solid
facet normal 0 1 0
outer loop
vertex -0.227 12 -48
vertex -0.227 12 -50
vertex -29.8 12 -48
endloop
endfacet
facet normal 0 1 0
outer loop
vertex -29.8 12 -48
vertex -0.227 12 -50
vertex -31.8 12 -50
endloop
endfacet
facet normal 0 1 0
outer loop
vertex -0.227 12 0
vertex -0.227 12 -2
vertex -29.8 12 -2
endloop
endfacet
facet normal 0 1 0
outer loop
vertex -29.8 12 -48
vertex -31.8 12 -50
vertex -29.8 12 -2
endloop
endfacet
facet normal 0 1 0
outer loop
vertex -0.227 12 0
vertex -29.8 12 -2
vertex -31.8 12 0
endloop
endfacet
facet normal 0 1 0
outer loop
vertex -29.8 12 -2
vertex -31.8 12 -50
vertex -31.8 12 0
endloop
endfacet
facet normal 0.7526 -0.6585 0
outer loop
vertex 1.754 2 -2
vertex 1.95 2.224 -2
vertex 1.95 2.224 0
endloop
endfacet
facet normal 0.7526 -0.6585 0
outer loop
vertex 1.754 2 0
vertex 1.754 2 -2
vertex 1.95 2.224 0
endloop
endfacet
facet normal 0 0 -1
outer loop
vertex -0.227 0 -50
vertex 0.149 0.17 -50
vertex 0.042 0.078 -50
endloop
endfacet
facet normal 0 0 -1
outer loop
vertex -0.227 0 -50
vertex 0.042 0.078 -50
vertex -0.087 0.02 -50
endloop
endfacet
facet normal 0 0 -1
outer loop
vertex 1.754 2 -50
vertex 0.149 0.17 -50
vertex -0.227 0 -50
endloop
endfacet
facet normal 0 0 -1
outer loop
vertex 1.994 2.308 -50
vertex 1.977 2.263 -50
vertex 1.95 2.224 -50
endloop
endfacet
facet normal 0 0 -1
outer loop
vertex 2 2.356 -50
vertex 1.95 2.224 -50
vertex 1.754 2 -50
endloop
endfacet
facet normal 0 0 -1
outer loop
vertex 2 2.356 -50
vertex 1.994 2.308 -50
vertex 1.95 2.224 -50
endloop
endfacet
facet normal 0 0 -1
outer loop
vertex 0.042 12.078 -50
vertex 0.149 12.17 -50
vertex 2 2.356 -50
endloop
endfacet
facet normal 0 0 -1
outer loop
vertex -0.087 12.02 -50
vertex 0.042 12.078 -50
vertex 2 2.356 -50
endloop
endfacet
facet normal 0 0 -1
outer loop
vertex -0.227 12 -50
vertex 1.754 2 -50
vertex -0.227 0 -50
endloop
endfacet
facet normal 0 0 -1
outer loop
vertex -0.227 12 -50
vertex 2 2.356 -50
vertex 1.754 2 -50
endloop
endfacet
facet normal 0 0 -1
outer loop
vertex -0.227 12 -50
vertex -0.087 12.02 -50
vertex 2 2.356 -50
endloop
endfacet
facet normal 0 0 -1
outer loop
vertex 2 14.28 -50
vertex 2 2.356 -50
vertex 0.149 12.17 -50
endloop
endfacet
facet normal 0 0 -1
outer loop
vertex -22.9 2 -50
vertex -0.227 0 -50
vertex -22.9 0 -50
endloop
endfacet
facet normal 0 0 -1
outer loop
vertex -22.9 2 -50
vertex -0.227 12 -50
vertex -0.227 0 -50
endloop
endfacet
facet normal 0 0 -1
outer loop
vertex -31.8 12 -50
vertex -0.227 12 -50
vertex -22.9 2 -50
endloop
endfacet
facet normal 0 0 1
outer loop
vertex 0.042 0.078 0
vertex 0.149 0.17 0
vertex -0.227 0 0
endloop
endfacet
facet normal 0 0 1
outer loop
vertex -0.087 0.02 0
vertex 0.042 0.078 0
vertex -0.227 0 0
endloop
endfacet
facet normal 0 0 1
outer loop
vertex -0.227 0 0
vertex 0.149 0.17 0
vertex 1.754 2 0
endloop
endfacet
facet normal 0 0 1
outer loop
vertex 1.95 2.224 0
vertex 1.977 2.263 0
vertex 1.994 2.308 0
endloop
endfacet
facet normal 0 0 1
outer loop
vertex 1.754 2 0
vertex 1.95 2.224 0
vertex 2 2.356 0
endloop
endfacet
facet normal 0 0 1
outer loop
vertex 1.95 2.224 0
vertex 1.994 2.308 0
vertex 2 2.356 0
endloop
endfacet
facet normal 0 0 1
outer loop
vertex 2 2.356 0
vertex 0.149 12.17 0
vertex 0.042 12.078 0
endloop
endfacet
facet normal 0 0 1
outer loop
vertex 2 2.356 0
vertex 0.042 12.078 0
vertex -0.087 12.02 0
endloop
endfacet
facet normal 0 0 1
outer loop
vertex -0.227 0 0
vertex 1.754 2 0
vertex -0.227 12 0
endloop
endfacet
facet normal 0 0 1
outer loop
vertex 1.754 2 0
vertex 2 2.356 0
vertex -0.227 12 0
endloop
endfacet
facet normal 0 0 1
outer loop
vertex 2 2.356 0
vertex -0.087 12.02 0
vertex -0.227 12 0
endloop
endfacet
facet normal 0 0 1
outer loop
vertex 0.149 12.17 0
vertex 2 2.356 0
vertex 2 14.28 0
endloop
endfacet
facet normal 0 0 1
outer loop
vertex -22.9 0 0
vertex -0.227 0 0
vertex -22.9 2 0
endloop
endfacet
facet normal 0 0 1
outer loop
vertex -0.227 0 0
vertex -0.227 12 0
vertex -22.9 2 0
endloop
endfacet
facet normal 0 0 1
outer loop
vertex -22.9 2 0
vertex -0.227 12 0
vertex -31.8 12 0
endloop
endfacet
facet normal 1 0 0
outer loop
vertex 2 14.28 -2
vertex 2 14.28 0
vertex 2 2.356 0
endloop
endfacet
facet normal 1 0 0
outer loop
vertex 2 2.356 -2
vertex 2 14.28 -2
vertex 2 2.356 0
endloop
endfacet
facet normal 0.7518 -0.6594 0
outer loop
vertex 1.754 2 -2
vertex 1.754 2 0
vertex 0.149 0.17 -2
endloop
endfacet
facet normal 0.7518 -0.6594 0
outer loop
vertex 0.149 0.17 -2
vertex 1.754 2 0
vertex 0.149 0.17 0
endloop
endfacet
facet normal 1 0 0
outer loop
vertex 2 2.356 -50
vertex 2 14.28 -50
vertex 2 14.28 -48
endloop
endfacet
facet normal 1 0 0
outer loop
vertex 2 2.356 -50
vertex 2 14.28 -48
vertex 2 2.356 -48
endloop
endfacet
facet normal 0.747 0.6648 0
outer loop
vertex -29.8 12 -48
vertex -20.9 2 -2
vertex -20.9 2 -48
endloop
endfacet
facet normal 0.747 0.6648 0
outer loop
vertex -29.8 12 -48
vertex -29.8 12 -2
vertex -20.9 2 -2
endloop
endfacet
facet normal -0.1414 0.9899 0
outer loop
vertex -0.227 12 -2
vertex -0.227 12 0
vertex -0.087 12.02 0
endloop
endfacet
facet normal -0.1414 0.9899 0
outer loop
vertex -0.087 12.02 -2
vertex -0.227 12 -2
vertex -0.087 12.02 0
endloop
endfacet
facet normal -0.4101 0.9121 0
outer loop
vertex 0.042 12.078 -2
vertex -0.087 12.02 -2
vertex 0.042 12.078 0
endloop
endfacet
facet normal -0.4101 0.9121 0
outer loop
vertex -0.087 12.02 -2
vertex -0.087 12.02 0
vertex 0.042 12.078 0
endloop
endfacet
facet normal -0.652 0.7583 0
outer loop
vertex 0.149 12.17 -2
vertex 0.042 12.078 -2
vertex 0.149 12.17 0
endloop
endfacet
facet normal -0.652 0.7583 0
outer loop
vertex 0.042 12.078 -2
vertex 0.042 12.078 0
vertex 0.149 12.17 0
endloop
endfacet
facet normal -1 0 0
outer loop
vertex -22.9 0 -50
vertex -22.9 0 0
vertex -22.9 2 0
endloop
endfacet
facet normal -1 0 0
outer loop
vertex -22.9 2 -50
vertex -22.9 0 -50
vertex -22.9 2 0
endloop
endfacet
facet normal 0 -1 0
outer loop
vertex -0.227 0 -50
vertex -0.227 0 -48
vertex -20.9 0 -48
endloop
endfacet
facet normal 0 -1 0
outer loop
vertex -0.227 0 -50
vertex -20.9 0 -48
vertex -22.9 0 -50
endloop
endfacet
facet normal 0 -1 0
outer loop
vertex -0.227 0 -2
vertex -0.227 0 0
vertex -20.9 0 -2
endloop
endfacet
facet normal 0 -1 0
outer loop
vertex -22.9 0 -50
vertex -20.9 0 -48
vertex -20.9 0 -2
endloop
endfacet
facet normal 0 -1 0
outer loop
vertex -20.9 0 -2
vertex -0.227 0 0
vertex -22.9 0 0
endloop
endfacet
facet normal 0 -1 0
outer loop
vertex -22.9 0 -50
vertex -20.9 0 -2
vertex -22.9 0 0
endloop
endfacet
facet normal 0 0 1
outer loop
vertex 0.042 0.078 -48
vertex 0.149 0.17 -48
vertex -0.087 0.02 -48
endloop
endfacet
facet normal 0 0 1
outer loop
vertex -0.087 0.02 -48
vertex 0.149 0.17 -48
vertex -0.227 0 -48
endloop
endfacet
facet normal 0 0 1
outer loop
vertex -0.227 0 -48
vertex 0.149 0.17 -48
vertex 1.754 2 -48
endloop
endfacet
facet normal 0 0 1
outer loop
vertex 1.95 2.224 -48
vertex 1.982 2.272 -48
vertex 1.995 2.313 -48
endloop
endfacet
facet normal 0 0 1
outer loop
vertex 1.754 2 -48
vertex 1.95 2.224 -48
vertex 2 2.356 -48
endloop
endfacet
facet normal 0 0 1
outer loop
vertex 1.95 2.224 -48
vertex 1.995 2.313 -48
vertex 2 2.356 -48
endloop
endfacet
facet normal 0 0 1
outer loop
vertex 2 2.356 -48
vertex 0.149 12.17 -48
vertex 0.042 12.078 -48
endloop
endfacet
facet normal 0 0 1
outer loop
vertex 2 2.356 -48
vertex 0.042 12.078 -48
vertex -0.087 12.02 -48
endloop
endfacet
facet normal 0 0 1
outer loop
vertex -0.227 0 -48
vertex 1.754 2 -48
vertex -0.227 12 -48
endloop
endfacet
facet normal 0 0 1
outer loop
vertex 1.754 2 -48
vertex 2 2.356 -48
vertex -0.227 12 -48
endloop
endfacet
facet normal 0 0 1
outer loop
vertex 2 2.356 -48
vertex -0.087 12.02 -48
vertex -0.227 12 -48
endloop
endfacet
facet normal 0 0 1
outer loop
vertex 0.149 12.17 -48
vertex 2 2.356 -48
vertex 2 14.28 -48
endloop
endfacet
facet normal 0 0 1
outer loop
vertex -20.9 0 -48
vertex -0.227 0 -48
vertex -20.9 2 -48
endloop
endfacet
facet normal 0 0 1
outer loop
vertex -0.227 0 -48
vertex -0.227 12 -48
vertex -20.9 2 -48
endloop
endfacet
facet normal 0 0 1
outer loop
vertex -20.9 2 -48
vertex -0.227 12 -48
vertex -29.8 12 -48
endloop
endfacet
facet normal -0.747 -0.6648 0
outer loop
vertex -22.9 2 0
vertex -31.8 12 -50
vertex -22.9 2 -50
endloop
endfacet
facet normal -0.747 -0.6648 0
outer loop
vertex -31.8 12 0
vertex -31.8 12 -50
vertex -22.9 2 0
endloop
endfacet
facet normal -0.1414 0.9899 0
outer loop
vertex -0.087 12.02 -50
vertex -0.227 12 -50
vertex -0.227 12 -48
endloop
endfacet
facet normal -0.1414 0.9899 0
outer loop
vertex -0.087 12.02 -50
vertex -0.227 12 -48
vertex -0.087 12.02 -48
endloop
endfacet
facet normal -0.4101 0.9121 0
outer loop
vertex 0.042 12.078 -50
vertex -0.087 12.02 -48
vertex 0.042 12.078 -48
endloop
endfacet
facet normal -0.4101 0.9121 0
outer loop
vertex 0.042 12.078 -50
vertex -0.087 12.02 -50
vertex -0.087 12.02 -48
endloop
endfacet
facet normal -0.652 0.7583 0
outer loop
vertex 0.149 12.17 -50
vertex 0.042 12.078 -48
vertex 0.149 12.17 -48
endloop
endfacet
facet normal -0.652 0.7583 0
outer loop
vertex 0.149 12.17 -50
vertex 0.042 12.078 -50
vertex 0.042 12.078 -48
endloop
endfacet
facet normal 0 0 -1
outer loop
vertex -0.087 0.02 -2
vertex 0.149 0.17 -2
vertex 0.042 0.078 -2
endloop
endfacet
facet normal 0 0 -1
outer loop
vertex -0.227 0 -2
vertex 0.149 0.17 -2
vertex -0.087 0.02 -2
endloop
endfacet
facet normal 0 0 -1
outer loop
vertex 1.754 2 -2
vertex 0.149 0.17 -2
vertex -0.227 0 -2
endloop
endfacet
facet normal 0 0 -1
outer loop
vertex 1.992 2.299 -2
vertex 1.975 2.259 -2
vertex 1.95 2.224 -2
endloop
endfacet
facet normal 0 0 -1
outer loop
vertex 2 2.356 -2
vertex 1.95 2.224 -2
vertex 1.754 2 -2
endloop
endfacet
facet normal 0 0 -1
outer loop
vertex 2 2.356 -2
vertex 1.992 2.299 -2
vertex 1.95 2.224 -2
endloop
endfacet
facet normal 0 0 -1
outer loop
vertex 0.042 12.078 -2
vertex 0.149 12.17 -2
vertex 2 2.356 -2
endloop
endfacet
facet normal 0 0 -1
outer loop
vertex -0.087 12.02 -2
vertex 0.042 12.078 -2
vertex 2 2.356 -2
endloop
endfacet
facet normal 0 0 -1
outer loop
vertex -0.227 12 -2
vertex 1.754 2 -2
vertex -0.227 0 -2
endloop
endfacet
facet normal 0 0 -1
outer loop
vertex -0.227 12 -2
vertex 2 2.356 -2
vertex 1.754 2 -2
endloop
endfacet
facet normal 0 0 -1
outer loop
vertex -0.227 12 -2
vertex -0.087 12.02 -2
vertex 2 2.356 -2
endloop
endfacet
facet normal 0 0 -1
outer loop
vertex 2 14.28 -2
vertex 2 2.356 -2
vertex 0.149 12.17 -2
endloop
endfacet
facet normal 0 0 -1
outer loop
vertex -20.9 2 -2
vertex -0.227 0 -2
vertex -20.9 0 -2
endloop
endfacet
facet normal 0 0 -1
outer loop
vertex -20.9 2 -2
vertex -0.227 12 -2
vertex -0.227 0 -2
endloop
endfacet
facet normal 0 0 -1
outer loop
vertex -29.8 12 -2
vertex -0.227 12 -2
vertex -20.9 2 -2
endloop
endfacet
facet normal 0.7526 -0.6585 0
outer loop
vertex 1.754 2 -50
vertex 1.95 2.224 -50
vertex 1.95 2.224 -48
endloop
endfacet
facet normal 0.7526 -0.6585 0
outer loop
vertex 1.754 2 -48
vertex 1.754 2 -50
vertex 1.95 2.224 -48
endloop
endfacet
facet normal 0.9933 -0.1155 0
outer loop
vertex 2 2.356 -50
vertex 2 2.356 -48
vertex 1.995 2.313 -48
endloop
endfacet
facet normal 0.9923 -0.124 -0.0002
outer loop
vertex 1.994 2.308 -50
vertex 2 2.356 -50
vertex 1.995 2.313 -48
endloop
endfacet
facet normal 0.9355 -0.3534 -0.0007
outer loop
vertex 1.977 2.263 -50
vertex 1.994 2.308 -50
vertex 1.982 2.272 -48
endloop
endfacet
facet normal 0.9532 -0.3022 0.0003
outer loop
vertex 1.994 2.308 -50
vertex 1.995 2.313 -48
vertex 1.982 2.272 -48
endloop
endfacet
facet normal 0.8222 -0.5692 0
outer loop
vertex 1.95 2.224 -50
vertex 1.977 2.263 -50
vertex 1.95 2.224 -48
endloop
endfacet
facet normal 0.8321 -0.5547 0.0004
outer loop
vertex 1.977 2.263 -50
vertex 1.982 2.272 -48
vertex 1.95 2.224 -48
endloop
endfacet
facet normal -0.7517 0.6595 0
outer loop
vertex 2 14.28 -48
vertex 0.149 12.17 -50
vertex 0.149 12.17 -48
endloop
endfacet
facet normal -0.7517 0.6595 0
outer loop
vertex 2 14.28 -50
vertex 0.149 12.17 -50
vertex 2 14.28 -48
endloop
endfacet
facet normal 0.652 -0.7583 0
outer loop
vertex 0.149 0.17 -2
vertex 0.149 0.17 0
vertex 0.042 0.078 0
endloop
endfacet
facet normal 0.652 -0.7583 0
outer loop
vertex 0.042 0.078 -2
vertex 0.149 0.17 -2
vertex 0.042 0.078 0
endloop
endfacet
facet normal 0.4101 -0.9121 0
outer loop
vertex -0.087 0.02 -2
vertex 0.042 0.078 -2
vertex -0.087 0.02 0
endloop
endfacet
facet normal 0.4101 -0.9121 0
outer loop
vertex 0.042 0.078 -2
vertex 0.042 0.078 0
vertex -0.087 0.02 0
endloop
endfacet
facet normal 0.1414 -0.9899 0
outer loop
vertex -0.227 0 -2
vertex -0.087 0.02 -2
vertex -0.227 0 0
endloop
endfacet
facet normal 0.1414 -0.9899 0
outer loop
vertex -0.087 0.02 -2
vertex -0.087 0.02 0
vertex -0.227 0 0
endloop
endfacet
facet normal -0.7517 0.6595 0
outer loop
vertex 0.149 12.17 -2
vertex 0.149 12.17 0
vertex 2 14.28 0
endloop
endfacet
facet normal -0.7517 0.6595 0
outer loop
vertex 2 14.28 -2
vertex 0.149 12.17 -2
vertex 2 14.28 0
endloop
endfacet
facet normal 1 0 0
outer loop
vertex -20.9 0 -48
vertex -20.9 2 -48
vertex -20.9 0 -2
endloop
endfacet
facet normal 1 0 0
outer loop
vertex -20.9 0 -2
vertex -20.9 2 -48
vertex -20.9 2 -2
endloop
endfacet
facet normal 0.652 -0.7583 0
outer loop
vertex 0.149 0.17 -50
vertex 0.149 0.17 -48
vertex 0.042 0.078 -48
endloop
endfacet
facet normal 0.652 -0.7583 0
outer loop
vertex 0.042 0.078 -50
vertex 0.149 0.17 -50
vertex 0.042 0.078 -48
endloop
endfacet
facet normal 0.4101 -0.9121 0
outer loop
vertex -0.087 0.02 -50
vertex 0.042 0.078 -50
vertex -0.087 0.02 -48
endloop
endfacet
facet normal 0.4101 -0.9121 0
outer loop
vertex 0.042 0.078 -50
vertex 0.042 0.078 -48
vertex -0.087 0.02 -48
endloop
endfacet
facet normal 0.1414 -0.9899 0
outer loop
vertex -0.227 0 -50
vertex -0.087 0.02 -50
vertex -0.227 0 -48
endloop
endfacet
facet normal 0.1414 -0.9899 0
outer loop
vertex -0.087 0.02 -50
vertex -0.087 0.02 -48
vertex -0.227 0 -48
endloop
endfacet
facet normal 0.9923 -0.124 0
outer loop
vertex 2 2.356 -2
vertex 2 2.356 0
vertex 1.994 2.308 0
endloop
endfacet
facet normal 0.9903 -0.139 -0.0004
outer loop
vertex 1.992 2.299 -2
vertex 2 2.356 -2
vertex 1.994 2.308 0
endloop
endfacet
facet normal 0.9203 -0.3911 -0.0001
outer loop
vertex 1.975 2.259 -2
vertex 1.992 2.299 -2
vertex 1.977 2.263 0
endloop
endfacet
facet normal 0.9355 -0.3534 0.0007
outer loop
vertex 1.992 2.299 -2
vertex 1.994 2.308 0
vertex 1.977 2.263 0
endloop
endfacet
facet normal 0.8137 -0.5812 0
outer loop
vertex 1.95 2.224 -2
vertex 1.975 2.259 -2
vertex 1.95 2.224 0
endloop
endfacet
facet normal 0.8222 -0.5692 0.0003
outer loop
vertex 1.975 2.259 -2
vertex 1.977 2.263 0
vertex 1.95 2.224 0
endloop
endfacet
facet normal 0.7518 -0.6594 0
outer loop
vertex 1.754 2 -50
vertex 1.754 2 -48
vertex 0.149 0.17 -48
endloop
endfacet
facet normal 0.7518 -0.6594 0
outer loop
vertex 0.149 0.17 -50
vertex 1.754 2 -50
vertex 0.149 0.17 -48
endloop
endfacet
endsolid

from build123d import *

# Parameters (mm, degrees)
BOSS_EXTRUDE1_DEPTH = 50
CUT_EXTRUDE1_DEPTH  = 13
FILLET1_R           = 0.2
CUT_EXTRUDE2_DEPTH  = 22.9
BOSS_EXTRUDE2_DEPTH = 2
BOSS_EXTRUDE4_START = -50
BOSS_EXTRUDE4_DEPTH = 2


with BuildPart() as part:
    # Sketch1 → Boss-Extrude1 (new body)
    with BuildSketch(Plane.XY):
        with BuildLine():
            Line((-0.226533162, 0), (-22.9, 0))
            Line((-22.9, 0), (-22.9, 2))
            Line((-22.9, 2), (-1.79756025, 2))
            ThreePointArc((-1.79756025, 2), (-1.552823997, 2.063990635), (-1.370731057, 2.239583333))
            ThreePointArc((-1.370731057, 2.239583333), (-0.802551257, 2.977276557), (-0.088888889, 3.575361503))
            ThreePointArc((-0.088888889, 3.575361503), (-0.023616579, 3.647376483), (0, 3.741657387))
            Line((0, 3.741657387), (0, 4))
            Line((0, 4), (2, 4))
            Line((2, 4), (2, 2.355630783))
            ThreePointArc((2, 2.355630783), (1.987179561, 2.285176459), (1.950361882, 2.223754688))
            Line((1.950361882, 2.223754688), (0.149371544, 0.170309763))
            ThreePointArc((0.149371544, 0.170309763), (-0.020190145, 0.044563331), (-0.226533162, 0))
        make_face()
    extrude(amount=-BOSS_EXTRUDE1_DEPTH)

    # Sketch3 → Loft1 section 0
    with BuildSketch(Plane(origin=(0, 2, 0), x_dir=(1, 0, 0), z_dir=(0, 1, 0))):
        with BuildLine():
            Line((2, 50), (-22.9, 50))
            Line((-22.9, 50), (-22.9, 0))
            Line((-22.9, 0), (2, 0))
            Line((2, 0), (2, 2))
            Line((2, 2), (-20.9, 2))
            Line((-20.9, 2), (-20.9, 48))
            Line((-20.9, 48), (2, 48))
            Line((2, 48), (2, 50))
        make_face()
    # Sketch4 → Loft1 section 1
    with BuildSketch(Plane(origin=(0, 12, 0), x_dir=(-1, 0, 0), z_dir=(0, 1, 0))):
        with BuildLine():
            Line((-2, -50), (31.8, -50))
            Line((31.8, -50), (31.8, 0))
            Line((31.8, 0), (-2, 0))
            Line((-2, 0), (-2, -2))
            Line((-2, -2), (29.8, -2))
            Line((29.8, -2), (29.8, -48))
            Line((29.8, -48), (-2, -48))
            Line((-2, -48), (-2, -50))
        make_face()
    loft()

    # Sketch5 → Cut-Extrude1 (cut)
    with BuildSketch(Plane(origin=(0, 0, 0), x_dir=(0, 0, -1), z_dir=(0.7518094115561124, -0.6593804733957871, 0))):
        Polygon((50, 0.226533162), (0, 0.226533162), (-3.433361375, 0.226533162), (-3.433361375, 4.468376884), (51.426542164, 4.468376884), (51.426542164, 0.226533162), align=None)
    extrude(amount=CUT_EXTRUDE1_DEPTH, mode=Mode.SUBTRACT)

    # Fillet1
    # the kernel refuses this fillet: 0.2 mm, written as the material it takes off along each edge
    with BuildSketch(Plane(origin=(2, 2.28035085, -47.811800168), x_dir=(0, 1, 0), z_dir=(0, 0, -1)), Plane(origin=(2, 2.28035085, 0.188199832), x_dir=(0, 1, 0), z_dir=(0, 0, -1))) as fillet1_piece_1:
        with BuildLine():
            CenterArc((FILLET1_R * 0.376399663711, -FILLET1_R), FILLET1_R, 90, 41.252641273)
            Line((-FILLET1_R * 0.282980809685, -FILLET1_R * 0.248190588444), (0, 0))
            Line((0, 0), (FILLET1_R * 0.376399663711, 0))
        make_face()
    extrude(amount=2.376399664, mode=Mode.SUBTRACT)

    # Sketch6 → Cut-Extrude2 (cut)
    with BuildSketch(Plane(origin=(2, 0, 0), x_dir=(0, 0, -1), z_dir=(1, 0, 0))):
        Polygon((2, 4), (2, 12), (48, 12), (48, 4), (48, -3.389982461), (2, -3.389982461), align=None)
    extrude(amount=-CUT_EXTRUDE2_DEPTH, mode=Mode.SUBTRACT)

    # Sketch7 → Boss-Extrude2 (add)
    with BuildSketch(Plane.XY):
        with BuildLine():
            Line((2, 14.28035085), (2, 12))
            Line((2, 12), (-0.226533162, 12))
            ThreePointArc((-0.226533162, 12), (-0.020190145, 12.044563331), (0.149371544, 12.170309763))
            Line((0.149371544, 12.170309763), (2, 14.28035085))
        make_face()
    extrude(amount=-BOSS_EXTRUDE2_DEPTH)

    # Sketch7<2> → Boss-Extrude4 (add)
    with BuildSketch(Plane.XY.offset(BOSS_EXTRUDE4_START)):
        with BuildLine():
            Line((2, 14.28035085), (2, 12))
            Line((2, 12), (-0.226533162, 12))
            ThreePointArc((-0.226533162, 12), (-0.020190145, 12.044563331), (0.149371544, 12.170309763))
            Line((0.149371544, 12.170309763), (2, 14.28035085))
        make_face()
    extrude(amount=BOSS_EXTRUDE4_DEPTH)


solid = part.part
